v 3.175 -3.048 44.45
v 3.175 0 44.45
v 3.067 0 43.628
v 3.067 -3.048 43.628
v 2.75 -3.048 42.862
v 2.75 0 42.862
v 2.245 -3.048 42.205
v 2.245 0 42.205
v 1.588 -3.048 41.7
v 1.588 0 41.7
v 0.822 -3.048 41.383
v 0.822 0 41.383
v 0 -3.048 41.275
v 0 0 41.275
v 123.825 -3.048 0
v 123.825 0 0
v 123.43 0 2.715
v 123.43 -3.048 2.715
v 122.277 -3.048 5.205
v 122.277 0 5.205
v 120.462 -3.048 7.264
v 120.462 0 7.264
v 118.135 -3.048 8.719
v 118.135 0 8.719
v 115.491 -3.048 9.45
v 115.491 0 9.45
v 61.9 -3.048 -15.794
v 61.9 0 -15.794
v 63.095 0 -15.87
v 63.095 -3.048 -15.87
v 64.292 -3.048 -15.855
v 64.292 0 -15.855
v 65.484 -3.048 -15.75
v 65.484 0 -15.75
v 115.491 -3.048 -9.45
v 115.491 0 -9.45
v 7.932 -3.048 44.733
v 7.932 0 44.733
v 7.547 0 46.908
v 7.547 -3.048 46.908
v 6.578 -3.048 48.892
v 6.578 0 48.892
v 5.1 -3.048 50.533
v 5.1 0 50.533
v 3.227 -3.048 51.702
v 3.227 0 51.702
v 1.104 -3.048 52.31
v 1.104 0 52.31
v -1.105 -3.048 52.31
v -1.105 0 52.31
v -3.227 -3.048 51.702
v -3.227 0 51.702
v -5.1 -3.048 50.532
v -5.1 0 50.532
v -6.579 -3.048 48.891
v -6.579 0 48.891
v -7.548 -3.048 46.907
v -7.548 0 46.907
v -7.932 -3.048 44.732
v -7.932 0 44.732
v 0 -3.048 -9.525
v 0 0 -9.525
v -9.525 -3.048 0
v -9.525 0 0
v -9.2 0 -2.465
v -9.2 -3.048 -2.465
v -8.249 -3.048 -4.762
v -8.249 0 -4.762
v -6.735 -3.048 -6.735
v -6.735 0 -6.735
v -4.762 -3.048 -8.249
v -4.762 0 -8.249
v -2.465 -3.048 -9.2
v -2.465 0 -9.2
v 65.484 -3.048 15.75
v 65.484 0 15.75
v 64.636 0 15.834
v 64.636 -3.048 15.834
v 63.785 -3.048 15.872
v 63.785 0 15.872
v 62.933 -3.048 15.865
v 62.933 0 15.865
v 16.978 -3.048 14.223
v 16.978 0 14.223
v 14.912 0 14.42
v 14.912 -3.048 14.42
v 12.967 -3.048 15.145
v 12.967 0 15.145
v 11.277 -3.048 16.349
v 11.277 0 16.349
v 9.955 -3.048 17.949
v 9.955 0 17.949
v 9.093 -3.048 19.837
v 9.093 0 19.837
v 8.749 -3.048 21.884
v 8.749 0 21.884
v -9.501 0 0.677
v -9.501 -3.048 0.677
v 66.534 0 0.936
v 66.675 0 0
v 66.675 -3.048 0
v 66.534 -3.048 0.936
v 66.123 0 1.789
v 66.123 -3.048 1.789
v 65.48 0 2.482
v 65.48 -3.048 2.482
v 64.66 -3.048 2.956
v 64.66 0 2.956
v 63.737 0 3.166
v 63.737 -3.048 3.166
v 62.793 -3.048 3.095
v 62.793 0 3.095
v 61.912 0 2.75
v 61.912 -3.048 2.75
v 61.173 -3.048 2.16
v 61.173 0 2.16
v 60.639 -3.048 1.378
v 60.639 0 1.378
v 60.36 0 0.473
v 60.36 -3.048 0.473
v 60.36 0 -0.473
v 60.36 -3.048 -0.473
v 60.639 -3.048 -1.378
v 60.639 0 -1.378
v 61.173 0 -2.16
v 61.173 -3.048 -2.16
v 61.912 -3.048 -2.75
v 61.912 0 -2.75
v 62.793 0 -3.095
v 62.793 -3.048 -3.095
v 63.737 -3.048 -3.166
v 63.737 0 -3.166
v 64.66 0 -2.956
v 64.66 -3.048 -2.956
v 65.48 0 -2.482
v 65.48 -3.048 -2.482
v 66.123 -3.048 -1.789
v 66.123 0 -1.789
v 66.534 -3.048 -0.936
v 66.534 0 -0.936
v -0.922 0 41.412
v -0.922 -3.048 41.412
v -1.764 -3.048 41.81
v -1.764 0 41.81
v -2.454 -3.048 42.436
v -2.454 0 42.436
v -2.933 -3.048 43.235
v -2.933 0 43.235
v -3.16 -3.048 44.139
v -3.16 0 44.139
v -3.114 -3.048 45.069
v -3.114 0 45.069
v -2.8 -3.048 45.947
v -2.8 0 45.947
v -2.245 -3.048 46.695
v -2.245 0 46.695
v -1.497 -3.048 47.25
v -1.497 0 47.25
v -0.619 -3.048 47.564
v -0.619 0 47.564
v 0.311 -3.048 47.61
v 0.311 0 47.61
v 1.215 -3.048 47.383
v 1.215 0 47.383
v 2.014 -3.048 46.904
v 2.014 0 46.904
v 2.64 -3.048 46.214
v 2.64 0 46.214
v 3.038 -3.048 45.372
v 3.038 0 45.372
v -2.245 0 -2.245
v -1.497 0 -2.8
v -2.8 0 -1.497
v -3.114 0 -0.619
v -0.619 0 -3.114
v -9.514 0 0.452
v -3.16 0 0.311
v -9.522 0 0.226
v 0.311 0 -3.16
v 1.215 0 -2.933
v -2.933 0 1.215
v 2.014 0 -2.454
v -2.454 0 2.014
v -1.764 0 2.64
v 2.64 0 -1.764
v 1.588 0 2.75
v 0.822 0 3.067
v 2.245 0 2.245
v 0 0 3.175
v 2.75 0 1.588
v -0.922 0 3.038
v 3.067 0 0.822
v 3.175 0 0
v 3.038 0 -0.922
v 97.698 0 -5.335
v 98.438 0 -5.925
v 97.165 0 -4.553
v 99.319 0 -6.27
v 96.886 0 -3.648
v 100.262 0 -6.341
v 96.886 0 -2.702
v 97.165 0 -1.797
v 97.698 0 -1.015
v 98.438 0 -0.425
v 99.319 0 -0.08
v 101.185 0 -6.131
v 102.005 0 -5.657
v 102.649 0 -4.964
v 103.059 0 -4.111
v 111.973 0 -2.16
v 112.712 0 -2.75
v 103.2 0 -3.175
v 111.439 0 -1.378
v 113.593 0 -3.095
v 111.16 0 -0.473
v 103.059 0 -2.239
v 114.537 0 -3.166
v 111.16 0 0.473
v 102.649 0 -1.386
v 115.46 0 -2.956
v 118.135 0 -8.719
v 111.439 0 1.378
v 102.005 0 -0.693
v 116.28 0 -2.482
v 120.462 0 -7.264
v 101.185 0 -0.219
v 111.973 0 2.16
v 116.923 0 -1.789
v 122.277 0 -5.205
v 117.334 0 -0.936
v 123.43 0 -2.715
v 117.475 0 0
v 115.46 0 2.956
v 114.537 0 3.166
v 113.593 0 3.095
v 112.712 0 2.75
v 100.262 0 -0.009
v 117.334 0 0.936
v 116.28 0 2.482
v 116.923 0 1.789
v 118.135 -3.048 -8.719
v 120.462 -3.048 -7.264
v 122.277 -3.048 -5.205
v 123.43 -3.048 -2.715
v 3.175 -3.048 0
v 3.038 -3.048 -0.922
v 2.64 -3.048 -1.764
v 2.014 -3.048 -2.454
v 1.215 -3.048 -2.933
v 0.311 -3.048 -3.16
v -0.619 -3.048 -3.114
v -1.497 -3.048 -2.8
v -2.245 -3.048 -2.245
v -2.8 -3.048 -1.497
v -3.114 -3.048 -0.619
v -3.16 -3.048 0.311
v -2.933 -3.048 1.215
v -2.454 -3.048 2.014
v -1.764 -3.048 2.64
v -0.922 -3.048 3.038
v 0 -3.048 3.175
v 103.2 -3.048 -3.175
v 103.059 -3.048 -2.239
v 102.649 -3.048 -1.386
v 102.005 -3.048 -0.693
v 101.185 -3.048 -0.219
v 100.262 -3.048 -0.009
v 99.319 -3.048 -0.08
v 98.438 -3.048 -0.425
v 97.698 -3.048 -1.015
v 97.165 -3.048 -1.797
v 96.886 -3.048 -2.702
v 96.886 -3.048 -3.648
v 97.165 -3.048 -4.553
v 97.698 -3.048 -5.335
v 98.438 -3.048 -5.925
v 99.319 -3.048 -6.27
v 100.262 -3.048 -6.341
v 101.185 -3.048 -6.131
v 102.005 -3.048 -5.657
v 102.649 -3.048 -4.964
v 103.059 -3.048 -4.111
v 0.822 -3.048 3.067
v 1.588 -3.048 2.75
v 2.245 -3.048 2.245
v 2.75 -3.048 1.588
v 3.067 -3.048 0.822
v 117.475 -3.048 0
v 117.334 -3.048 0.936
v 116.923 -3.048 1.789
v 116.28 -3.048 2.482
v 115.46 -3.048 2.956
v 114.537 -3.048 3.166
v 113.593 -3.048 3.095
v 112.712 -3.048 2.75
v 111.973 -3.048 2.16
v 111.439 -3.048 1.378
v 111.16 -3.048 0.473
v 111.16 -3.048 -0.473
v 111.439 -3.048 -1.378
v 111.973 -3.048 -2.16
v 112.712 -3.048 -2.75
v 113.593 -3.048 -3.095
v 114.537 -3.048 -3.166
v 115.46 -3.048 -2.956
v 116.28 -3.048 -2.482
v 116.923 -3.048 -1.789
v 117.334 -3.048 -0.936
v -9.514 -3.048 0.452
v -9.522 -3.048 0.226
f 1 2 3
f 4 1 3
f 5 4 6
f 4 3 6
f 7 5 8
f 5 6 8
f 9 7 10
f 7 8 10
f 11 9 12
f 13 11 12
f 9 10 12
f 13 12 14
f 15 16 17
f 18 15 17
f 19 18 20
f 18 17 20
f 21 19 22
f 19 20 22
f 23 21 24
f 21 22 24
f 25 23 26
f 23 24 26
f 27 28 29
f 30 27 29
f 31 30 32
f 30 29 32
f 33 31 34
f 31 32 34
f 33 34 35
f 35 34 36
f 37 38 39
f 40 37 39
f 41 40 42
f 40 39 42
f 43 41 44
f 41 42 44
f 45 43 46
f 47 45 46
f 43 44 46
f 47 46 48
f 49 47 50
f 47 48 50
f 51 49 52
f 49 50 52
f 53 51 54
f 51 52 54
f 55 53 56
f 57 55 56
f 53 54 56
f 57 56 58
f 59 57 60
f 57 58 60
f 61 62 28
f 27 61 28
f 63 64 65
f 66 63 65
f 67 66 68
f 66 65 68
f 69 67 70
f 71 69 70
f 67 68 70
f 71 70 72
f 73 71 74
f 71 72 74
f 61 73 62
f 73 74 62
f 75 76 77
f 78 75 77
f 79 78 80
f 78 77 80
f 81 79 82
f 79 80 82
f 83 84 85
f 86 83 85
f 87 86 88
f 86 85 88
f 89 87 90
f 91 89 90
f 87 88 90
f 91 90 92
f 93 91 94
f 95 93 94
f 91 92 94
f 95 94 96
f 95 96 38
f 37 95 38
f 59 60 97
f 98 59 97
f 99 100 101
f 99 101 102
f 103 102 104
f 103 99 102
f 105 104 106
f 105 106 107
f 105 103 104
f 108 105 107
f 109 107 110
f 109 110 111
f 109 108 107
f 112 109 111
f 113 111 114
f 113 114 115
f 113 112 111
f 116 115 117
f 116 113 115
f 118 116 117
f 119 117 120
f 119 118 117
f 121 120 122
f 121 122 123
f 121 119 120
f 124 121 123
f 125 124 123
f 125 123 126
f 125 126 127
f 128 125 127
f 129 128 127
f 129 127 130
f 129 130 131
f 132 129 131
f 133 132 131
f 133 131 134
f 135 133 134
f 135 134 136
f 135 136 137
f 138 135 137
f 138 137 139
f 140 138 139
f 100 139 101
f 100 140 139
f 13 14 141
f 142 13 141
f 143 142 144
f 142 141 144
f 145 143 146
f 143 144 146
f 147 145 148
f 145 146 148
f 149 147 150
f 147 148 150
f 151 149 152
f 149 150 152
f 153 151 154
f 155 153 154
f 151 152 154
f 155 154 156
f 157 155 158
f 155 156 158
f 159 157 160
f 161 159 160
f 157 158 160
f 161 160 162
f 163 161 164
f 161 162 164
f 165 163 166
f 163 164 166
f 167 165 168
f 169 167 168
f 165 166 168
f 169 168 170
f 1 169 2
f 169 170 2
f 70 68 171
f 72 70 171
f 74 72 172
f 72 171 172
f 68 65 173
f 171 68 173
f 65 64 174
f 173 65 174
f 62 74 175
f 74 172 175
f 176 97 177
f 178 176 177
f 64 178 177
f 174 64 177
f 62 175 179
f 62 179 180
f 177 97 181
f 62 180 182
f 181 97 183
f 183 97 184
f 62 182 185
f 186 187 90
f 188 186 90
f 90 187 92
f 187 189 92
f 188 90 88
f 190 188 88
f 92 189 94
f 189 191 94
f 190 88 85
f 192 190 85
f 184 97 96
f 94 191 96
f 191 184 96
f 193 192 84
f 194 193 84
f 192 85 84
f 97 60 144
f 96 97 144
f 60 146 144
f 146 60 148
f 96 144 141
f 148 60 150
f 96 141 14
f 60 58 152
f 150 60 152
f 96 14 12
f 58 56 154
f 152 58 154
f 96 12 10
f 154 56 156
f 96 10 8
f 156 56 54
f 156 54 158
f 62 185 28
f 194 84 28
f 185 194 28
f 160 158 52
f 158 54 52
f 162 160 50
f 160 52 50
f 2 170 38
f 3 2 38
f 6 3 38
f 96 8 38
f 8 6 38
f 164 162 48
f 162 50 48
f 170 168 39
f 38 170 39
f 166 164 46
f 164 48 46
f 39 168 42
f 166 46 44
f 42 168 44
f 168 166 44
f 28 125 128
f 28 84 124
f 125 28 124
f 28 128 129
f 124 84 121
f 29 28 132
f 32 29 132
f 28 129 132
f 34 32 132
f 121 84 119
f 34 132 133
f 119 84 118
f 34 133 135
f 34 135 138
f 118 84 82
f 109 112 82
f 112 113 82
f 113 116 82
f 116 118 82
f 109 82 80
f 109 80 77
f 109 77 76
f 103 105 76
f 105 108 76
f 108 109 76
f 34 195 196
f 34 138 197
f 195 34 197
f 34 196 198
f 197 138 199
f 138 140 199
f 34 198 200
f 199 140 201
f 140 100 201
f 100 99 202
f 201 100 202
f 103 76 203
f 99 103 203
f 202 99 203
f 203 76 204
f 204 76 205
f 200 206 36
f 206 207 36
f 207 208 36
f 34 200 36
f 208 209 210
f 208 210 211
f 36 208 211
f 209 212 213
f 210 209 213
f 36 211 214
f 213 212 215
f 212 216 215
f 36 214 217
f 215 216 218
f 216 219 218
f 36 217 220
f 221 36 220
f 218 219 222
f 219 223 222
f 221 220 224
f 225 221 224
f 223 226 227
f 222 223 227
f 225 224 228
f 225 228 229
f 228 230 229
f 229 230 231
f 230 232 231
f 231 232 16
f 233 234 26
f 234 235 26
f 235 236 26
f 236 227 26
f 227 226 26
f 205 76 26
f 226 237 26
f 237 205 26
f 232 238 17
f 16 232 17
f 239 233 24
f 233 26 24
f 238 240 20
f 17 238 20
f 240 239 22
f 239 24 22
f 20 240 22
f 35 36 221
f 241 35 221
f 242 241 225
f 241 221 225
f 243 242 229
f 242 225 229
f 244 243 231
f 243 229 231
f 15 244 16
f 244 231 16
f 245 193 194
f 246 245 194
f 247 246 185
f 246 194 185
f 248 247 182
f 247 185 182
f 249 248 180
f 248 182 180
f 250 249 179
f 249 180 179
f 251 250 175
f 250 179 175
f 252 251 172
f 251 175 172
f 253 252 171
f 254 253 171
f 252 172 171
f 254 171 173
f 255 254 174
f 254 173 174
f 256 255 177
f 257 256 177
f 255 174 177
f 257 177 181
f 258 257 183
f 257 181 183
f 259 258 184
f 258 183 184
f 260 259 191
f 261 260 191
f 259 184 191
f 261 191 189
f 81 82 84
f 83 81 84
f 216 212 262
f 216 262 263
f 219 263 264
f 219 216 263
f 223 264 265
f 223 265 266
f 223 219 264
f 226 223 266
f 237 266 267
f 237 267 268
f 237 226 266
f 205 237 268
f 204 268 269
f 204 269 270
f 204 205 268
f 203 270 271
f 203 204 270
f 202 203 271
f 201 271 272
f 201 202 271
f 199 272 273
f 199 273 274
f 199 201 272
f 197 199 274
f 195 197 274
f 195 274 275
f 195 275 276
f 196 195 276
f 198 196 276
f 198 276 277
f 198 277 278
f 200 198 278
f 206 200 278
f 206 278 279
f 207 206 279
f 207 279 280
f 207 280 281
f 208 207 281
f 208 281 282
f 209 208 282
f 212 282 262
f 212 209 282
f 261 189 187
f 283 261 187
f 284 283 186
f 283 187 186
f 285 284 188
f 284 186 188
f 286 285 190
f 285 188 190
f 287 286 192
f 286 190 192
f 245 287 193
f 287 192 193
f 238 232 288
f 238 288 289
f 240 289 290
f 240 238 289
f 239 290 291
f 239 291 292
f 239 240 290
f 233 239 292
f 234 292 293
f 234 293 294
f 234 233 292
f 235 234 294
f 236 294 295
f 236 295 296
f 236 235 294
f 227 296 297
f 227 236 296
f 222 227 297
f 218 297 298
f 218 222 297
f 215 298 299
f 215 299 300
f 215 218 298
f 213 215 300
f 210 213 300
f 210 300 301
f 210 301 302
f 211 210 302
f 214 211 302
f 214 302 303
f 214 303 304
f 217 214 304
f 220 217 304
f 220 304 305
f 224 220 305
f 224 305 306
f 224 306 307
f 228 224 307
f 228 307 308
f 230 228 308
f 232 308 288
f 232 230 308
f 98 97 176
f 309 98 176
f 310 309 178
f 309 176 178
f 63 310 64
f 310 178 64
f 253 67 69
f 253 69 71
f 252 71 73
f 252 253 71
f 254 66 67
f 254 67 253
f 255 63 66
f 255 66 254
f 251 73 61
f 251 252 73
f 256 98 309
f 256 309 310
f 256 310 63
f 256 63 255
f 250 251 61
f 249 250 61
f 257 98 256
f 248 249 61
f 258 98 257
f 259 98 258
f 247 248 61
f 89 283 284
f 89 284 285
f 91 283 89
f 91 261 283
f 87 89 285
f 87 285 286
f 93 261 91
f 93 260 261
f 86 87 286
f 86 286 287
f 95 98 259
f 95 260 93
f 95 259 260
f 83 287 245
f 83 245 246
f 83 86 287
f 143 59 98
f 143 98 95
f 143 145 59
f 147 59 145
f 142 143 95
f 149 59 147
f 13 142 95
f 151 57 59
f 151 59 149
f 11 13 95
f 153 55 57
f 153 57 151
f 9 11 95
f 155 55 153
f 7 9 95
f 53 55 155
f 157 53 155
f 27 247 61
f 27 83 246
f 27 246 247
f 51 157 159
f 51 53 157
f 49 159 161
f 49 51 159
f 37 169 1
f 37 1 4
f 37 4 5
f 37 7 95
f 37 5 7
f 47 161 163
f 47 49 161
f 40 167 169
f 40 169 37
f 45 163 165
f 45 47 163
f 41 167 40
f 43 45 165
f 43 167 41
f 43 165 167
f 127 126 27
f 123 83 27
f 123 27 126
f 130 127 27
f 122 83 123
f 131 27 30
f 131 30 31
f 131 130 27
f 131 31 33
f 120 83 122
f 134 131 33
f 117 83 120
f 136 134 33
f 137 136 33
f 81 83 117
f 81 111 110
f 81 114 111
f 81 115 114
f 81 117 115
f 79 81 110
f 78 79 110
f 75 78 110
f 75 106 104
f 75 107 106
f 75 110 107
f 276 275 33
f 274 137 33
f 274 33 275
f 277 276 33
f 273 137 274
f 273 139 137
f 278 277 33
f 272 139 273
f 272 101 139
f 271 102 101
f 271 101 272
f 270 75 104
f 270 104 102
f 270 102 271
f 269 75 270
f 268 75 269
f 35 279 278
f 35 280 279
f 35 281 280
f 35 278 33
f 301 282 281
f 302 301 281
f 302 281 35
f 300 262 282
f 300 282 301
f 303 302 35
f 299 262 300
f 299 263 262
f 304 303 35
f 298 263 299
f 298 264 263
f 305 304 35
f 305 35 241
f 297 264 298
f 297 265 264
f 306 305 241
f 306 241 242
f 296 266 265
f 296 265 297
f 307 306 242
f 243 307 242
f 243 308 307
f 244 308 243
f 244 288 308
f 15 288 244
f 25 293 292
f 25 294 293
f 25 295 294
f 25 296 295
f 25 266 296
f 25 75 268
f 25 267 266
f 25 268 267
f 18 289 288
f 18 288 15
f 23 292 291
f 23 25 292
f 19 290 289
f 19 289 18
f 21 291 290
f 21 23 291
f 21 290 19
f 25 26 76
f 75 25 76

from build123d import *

# Parameters (mm, degrees)
F0_R     = 3.175
F1_DEPTH = 3.048


with BuildPart() as f1:
    # F0 (on Front) → F1 (new body)
    with BuildSketch(Plane.XZ):
        with BuildLine():
            ThreePointArc((9.525, 0), (6.7351920908, 6.7351920908), (0, 9.525))
            ThreePointArc((0, 9.525), (-6.4912990883, 6.9705567315), (-9.500885786, 0.6773435479))
            Line((-9.500885786, 0.6773435479), (-9.525, 0))
            ThreePointArc((-9.525, 0), (-6.7351920908, -6.7351920908), (0, -9.525))
            ThreePointArc((0, -9.525), (6.7351920908, -6.7351920908), (9.525, 0))
        make_face()
        with BuildLine():
            ThreePointArc((3.175, 0), (-2.2450640303, -2.2450640303), (0, 3.175))
            ThreePointArc((0, 3.175), (2.2450640303, 2.2450640303), (3.175, 0))
        make_face(mode=Mode.SUBTRACT)
        with BuildLine():
            ThreePointArc((-9.500885786, 0.6773435479), (-6.4912990883, 6.9705567315), (0, 9.525))
            Line((0, 9.525), (0, 36.5125))
            ThreePointArc((0, 36.5125), (-5.7116327839, 38.9380895153), (-7.9324746146, 44.7324052746))
            Line((-7.9324746146, 44.7324052746), (-9.500885786, 0.6773435479))
        make_face()
        with BuildLine():
            Line((0, 36.5125), (0, 9.525))
            ThreePointArc((0, 9.525), (6.7351920908, 6.7351920908), (9.525, 0))
            ThreePointArc((9.525, 0), (6.7351920908, -6.7351920908), (0, -9.525))
            Line((0, -9.525), (61.9003804205, -15.7942028036))
            ThreePointArc((61.9003804205, -15.7942028036), (47.6334382359, 0.5175353004), (62.9330357143, 15.8648724073))
            Line((62.9330357143, 15.8648724073), (16.9780821582, 14.2225763491))
            ThreePointArc((16.9780821582, 14.2225763491), (11.2768653549, 16.3488776236), (8.7490183423, 21.8837687364))
            Line((8.7490183423, 21.8837687364), (7.9324362036, 44.7334821429))
            ThreePointArc((7.9324362036, 44.7334821429), (7.9362339499, 44.5917636831), (7.9375, 44.45))
            ThreePointArc((7.9375, 44.45), (5.6126600757, 38.8373399243), (0, 36.5125))
        make_face()
        with BuildLine():
            ThreePointArc((-7.9324746146, 44.7324052746), (-5.7116327839, 38.9380895153), (0, 36.5125))
            ThreePointArc((0, 36.5125), (5.6126600757, 38.8373399243), (7.9375, 44.45))
            ThreePointArc((7.9375, 44.45), (7.9362339499, 44.5917636831), (7.9324362036, 44.7334821429))
            ThreePointArc((7.9324362036, 44.7334821429), (-0.0005387766, 52.3874999817), (-7.9324746146, 44.7324052746))
        make_face()
        with BuildLine():
            ThreePointArc((3.175, 44.45), (2.2450640303, 42.2049359697), (0, 41.275))
            ThreePointArc((0, 41.275), (-2.2450640303, 46.6950640303), (3.175, 44.45))
        make_face(mode=Mode.SUBTRACT)
        with BuildLine():
            Line((-9.525, 0), (-9.500885786, 0.6773435479))
            ThreePointArc((-9.500885786, 0.6773435479), (-9.5189695375, 0.3388863295), (-9.525, 0))
        make_face()
        with BuildLine():
            ThreePointArc((62.9330357143, 15.8648724073), (47.6334382359, 0.5175353004), (61.9003804205, -15.7942028036))
            ThreePointArc((61.9003804205, -15.7942028036), (63.6936154008, -15.8738192656), (65.484375, -15.7504882737))
            ThreePointArc((65.484375, -15.7504882737), (75.40625, -10.5003255158), (79.375, 0))
            ThreePointArc((79.375, 0), (75.40625, 10.5003255158), (65.484375, 15.7504882737))
            ThreePointArc((65.484375, 15.7504882737), (64.2110092937, 15.8590696696), (62.9330357143, 15.8648724073))
        make_face()
        with Locations((63.5, 0)):
            Circle(F0_R, mode=Mode.SUBTRACT)
        with BuildLine():
            ThreePointArc((79.375, 0), (75.40625, -10.5003255158), (65.484375, -15.7504882737))
            Line((65.484375, -15.7504882737), (115.490625, -9.4502929642))
            ThreePointArc((115.490625, -9.4502929642), (104.775, 0), (115.490625, 9.4502929642))
            Line((115.490625, 9.4502929642), (65.484375, 15.7504882737))
            ThreePointArc((65.484375, 15.7504882737), (75.40625, 10.5003255158), (79.375, 0))
        make_face()
        with Locations((100.0252, -3.175)):
            Circle(F0_R, mode=Mode.SUBTRACT)
        with BuildLine():
            ThreePointArc((115.490625, 9.4502929642), (104.775, 0), (115.490625, -9.4502929642))
            ThreePointArc((115.490625, -9.4502929642), (121.44375, -6.3001953095), (123.825, 0))
            ThreePointArc((123.825, 0), (121.44375, 6.3001953095), (115.490625, 9.4502929642))
        make_face()
        with Locations((114.3, 0)):
            Circle(F0_R, mode=Mode.SUBTRACT)
    extrude(amount=F1_DEPTH)


solid = f1.part
